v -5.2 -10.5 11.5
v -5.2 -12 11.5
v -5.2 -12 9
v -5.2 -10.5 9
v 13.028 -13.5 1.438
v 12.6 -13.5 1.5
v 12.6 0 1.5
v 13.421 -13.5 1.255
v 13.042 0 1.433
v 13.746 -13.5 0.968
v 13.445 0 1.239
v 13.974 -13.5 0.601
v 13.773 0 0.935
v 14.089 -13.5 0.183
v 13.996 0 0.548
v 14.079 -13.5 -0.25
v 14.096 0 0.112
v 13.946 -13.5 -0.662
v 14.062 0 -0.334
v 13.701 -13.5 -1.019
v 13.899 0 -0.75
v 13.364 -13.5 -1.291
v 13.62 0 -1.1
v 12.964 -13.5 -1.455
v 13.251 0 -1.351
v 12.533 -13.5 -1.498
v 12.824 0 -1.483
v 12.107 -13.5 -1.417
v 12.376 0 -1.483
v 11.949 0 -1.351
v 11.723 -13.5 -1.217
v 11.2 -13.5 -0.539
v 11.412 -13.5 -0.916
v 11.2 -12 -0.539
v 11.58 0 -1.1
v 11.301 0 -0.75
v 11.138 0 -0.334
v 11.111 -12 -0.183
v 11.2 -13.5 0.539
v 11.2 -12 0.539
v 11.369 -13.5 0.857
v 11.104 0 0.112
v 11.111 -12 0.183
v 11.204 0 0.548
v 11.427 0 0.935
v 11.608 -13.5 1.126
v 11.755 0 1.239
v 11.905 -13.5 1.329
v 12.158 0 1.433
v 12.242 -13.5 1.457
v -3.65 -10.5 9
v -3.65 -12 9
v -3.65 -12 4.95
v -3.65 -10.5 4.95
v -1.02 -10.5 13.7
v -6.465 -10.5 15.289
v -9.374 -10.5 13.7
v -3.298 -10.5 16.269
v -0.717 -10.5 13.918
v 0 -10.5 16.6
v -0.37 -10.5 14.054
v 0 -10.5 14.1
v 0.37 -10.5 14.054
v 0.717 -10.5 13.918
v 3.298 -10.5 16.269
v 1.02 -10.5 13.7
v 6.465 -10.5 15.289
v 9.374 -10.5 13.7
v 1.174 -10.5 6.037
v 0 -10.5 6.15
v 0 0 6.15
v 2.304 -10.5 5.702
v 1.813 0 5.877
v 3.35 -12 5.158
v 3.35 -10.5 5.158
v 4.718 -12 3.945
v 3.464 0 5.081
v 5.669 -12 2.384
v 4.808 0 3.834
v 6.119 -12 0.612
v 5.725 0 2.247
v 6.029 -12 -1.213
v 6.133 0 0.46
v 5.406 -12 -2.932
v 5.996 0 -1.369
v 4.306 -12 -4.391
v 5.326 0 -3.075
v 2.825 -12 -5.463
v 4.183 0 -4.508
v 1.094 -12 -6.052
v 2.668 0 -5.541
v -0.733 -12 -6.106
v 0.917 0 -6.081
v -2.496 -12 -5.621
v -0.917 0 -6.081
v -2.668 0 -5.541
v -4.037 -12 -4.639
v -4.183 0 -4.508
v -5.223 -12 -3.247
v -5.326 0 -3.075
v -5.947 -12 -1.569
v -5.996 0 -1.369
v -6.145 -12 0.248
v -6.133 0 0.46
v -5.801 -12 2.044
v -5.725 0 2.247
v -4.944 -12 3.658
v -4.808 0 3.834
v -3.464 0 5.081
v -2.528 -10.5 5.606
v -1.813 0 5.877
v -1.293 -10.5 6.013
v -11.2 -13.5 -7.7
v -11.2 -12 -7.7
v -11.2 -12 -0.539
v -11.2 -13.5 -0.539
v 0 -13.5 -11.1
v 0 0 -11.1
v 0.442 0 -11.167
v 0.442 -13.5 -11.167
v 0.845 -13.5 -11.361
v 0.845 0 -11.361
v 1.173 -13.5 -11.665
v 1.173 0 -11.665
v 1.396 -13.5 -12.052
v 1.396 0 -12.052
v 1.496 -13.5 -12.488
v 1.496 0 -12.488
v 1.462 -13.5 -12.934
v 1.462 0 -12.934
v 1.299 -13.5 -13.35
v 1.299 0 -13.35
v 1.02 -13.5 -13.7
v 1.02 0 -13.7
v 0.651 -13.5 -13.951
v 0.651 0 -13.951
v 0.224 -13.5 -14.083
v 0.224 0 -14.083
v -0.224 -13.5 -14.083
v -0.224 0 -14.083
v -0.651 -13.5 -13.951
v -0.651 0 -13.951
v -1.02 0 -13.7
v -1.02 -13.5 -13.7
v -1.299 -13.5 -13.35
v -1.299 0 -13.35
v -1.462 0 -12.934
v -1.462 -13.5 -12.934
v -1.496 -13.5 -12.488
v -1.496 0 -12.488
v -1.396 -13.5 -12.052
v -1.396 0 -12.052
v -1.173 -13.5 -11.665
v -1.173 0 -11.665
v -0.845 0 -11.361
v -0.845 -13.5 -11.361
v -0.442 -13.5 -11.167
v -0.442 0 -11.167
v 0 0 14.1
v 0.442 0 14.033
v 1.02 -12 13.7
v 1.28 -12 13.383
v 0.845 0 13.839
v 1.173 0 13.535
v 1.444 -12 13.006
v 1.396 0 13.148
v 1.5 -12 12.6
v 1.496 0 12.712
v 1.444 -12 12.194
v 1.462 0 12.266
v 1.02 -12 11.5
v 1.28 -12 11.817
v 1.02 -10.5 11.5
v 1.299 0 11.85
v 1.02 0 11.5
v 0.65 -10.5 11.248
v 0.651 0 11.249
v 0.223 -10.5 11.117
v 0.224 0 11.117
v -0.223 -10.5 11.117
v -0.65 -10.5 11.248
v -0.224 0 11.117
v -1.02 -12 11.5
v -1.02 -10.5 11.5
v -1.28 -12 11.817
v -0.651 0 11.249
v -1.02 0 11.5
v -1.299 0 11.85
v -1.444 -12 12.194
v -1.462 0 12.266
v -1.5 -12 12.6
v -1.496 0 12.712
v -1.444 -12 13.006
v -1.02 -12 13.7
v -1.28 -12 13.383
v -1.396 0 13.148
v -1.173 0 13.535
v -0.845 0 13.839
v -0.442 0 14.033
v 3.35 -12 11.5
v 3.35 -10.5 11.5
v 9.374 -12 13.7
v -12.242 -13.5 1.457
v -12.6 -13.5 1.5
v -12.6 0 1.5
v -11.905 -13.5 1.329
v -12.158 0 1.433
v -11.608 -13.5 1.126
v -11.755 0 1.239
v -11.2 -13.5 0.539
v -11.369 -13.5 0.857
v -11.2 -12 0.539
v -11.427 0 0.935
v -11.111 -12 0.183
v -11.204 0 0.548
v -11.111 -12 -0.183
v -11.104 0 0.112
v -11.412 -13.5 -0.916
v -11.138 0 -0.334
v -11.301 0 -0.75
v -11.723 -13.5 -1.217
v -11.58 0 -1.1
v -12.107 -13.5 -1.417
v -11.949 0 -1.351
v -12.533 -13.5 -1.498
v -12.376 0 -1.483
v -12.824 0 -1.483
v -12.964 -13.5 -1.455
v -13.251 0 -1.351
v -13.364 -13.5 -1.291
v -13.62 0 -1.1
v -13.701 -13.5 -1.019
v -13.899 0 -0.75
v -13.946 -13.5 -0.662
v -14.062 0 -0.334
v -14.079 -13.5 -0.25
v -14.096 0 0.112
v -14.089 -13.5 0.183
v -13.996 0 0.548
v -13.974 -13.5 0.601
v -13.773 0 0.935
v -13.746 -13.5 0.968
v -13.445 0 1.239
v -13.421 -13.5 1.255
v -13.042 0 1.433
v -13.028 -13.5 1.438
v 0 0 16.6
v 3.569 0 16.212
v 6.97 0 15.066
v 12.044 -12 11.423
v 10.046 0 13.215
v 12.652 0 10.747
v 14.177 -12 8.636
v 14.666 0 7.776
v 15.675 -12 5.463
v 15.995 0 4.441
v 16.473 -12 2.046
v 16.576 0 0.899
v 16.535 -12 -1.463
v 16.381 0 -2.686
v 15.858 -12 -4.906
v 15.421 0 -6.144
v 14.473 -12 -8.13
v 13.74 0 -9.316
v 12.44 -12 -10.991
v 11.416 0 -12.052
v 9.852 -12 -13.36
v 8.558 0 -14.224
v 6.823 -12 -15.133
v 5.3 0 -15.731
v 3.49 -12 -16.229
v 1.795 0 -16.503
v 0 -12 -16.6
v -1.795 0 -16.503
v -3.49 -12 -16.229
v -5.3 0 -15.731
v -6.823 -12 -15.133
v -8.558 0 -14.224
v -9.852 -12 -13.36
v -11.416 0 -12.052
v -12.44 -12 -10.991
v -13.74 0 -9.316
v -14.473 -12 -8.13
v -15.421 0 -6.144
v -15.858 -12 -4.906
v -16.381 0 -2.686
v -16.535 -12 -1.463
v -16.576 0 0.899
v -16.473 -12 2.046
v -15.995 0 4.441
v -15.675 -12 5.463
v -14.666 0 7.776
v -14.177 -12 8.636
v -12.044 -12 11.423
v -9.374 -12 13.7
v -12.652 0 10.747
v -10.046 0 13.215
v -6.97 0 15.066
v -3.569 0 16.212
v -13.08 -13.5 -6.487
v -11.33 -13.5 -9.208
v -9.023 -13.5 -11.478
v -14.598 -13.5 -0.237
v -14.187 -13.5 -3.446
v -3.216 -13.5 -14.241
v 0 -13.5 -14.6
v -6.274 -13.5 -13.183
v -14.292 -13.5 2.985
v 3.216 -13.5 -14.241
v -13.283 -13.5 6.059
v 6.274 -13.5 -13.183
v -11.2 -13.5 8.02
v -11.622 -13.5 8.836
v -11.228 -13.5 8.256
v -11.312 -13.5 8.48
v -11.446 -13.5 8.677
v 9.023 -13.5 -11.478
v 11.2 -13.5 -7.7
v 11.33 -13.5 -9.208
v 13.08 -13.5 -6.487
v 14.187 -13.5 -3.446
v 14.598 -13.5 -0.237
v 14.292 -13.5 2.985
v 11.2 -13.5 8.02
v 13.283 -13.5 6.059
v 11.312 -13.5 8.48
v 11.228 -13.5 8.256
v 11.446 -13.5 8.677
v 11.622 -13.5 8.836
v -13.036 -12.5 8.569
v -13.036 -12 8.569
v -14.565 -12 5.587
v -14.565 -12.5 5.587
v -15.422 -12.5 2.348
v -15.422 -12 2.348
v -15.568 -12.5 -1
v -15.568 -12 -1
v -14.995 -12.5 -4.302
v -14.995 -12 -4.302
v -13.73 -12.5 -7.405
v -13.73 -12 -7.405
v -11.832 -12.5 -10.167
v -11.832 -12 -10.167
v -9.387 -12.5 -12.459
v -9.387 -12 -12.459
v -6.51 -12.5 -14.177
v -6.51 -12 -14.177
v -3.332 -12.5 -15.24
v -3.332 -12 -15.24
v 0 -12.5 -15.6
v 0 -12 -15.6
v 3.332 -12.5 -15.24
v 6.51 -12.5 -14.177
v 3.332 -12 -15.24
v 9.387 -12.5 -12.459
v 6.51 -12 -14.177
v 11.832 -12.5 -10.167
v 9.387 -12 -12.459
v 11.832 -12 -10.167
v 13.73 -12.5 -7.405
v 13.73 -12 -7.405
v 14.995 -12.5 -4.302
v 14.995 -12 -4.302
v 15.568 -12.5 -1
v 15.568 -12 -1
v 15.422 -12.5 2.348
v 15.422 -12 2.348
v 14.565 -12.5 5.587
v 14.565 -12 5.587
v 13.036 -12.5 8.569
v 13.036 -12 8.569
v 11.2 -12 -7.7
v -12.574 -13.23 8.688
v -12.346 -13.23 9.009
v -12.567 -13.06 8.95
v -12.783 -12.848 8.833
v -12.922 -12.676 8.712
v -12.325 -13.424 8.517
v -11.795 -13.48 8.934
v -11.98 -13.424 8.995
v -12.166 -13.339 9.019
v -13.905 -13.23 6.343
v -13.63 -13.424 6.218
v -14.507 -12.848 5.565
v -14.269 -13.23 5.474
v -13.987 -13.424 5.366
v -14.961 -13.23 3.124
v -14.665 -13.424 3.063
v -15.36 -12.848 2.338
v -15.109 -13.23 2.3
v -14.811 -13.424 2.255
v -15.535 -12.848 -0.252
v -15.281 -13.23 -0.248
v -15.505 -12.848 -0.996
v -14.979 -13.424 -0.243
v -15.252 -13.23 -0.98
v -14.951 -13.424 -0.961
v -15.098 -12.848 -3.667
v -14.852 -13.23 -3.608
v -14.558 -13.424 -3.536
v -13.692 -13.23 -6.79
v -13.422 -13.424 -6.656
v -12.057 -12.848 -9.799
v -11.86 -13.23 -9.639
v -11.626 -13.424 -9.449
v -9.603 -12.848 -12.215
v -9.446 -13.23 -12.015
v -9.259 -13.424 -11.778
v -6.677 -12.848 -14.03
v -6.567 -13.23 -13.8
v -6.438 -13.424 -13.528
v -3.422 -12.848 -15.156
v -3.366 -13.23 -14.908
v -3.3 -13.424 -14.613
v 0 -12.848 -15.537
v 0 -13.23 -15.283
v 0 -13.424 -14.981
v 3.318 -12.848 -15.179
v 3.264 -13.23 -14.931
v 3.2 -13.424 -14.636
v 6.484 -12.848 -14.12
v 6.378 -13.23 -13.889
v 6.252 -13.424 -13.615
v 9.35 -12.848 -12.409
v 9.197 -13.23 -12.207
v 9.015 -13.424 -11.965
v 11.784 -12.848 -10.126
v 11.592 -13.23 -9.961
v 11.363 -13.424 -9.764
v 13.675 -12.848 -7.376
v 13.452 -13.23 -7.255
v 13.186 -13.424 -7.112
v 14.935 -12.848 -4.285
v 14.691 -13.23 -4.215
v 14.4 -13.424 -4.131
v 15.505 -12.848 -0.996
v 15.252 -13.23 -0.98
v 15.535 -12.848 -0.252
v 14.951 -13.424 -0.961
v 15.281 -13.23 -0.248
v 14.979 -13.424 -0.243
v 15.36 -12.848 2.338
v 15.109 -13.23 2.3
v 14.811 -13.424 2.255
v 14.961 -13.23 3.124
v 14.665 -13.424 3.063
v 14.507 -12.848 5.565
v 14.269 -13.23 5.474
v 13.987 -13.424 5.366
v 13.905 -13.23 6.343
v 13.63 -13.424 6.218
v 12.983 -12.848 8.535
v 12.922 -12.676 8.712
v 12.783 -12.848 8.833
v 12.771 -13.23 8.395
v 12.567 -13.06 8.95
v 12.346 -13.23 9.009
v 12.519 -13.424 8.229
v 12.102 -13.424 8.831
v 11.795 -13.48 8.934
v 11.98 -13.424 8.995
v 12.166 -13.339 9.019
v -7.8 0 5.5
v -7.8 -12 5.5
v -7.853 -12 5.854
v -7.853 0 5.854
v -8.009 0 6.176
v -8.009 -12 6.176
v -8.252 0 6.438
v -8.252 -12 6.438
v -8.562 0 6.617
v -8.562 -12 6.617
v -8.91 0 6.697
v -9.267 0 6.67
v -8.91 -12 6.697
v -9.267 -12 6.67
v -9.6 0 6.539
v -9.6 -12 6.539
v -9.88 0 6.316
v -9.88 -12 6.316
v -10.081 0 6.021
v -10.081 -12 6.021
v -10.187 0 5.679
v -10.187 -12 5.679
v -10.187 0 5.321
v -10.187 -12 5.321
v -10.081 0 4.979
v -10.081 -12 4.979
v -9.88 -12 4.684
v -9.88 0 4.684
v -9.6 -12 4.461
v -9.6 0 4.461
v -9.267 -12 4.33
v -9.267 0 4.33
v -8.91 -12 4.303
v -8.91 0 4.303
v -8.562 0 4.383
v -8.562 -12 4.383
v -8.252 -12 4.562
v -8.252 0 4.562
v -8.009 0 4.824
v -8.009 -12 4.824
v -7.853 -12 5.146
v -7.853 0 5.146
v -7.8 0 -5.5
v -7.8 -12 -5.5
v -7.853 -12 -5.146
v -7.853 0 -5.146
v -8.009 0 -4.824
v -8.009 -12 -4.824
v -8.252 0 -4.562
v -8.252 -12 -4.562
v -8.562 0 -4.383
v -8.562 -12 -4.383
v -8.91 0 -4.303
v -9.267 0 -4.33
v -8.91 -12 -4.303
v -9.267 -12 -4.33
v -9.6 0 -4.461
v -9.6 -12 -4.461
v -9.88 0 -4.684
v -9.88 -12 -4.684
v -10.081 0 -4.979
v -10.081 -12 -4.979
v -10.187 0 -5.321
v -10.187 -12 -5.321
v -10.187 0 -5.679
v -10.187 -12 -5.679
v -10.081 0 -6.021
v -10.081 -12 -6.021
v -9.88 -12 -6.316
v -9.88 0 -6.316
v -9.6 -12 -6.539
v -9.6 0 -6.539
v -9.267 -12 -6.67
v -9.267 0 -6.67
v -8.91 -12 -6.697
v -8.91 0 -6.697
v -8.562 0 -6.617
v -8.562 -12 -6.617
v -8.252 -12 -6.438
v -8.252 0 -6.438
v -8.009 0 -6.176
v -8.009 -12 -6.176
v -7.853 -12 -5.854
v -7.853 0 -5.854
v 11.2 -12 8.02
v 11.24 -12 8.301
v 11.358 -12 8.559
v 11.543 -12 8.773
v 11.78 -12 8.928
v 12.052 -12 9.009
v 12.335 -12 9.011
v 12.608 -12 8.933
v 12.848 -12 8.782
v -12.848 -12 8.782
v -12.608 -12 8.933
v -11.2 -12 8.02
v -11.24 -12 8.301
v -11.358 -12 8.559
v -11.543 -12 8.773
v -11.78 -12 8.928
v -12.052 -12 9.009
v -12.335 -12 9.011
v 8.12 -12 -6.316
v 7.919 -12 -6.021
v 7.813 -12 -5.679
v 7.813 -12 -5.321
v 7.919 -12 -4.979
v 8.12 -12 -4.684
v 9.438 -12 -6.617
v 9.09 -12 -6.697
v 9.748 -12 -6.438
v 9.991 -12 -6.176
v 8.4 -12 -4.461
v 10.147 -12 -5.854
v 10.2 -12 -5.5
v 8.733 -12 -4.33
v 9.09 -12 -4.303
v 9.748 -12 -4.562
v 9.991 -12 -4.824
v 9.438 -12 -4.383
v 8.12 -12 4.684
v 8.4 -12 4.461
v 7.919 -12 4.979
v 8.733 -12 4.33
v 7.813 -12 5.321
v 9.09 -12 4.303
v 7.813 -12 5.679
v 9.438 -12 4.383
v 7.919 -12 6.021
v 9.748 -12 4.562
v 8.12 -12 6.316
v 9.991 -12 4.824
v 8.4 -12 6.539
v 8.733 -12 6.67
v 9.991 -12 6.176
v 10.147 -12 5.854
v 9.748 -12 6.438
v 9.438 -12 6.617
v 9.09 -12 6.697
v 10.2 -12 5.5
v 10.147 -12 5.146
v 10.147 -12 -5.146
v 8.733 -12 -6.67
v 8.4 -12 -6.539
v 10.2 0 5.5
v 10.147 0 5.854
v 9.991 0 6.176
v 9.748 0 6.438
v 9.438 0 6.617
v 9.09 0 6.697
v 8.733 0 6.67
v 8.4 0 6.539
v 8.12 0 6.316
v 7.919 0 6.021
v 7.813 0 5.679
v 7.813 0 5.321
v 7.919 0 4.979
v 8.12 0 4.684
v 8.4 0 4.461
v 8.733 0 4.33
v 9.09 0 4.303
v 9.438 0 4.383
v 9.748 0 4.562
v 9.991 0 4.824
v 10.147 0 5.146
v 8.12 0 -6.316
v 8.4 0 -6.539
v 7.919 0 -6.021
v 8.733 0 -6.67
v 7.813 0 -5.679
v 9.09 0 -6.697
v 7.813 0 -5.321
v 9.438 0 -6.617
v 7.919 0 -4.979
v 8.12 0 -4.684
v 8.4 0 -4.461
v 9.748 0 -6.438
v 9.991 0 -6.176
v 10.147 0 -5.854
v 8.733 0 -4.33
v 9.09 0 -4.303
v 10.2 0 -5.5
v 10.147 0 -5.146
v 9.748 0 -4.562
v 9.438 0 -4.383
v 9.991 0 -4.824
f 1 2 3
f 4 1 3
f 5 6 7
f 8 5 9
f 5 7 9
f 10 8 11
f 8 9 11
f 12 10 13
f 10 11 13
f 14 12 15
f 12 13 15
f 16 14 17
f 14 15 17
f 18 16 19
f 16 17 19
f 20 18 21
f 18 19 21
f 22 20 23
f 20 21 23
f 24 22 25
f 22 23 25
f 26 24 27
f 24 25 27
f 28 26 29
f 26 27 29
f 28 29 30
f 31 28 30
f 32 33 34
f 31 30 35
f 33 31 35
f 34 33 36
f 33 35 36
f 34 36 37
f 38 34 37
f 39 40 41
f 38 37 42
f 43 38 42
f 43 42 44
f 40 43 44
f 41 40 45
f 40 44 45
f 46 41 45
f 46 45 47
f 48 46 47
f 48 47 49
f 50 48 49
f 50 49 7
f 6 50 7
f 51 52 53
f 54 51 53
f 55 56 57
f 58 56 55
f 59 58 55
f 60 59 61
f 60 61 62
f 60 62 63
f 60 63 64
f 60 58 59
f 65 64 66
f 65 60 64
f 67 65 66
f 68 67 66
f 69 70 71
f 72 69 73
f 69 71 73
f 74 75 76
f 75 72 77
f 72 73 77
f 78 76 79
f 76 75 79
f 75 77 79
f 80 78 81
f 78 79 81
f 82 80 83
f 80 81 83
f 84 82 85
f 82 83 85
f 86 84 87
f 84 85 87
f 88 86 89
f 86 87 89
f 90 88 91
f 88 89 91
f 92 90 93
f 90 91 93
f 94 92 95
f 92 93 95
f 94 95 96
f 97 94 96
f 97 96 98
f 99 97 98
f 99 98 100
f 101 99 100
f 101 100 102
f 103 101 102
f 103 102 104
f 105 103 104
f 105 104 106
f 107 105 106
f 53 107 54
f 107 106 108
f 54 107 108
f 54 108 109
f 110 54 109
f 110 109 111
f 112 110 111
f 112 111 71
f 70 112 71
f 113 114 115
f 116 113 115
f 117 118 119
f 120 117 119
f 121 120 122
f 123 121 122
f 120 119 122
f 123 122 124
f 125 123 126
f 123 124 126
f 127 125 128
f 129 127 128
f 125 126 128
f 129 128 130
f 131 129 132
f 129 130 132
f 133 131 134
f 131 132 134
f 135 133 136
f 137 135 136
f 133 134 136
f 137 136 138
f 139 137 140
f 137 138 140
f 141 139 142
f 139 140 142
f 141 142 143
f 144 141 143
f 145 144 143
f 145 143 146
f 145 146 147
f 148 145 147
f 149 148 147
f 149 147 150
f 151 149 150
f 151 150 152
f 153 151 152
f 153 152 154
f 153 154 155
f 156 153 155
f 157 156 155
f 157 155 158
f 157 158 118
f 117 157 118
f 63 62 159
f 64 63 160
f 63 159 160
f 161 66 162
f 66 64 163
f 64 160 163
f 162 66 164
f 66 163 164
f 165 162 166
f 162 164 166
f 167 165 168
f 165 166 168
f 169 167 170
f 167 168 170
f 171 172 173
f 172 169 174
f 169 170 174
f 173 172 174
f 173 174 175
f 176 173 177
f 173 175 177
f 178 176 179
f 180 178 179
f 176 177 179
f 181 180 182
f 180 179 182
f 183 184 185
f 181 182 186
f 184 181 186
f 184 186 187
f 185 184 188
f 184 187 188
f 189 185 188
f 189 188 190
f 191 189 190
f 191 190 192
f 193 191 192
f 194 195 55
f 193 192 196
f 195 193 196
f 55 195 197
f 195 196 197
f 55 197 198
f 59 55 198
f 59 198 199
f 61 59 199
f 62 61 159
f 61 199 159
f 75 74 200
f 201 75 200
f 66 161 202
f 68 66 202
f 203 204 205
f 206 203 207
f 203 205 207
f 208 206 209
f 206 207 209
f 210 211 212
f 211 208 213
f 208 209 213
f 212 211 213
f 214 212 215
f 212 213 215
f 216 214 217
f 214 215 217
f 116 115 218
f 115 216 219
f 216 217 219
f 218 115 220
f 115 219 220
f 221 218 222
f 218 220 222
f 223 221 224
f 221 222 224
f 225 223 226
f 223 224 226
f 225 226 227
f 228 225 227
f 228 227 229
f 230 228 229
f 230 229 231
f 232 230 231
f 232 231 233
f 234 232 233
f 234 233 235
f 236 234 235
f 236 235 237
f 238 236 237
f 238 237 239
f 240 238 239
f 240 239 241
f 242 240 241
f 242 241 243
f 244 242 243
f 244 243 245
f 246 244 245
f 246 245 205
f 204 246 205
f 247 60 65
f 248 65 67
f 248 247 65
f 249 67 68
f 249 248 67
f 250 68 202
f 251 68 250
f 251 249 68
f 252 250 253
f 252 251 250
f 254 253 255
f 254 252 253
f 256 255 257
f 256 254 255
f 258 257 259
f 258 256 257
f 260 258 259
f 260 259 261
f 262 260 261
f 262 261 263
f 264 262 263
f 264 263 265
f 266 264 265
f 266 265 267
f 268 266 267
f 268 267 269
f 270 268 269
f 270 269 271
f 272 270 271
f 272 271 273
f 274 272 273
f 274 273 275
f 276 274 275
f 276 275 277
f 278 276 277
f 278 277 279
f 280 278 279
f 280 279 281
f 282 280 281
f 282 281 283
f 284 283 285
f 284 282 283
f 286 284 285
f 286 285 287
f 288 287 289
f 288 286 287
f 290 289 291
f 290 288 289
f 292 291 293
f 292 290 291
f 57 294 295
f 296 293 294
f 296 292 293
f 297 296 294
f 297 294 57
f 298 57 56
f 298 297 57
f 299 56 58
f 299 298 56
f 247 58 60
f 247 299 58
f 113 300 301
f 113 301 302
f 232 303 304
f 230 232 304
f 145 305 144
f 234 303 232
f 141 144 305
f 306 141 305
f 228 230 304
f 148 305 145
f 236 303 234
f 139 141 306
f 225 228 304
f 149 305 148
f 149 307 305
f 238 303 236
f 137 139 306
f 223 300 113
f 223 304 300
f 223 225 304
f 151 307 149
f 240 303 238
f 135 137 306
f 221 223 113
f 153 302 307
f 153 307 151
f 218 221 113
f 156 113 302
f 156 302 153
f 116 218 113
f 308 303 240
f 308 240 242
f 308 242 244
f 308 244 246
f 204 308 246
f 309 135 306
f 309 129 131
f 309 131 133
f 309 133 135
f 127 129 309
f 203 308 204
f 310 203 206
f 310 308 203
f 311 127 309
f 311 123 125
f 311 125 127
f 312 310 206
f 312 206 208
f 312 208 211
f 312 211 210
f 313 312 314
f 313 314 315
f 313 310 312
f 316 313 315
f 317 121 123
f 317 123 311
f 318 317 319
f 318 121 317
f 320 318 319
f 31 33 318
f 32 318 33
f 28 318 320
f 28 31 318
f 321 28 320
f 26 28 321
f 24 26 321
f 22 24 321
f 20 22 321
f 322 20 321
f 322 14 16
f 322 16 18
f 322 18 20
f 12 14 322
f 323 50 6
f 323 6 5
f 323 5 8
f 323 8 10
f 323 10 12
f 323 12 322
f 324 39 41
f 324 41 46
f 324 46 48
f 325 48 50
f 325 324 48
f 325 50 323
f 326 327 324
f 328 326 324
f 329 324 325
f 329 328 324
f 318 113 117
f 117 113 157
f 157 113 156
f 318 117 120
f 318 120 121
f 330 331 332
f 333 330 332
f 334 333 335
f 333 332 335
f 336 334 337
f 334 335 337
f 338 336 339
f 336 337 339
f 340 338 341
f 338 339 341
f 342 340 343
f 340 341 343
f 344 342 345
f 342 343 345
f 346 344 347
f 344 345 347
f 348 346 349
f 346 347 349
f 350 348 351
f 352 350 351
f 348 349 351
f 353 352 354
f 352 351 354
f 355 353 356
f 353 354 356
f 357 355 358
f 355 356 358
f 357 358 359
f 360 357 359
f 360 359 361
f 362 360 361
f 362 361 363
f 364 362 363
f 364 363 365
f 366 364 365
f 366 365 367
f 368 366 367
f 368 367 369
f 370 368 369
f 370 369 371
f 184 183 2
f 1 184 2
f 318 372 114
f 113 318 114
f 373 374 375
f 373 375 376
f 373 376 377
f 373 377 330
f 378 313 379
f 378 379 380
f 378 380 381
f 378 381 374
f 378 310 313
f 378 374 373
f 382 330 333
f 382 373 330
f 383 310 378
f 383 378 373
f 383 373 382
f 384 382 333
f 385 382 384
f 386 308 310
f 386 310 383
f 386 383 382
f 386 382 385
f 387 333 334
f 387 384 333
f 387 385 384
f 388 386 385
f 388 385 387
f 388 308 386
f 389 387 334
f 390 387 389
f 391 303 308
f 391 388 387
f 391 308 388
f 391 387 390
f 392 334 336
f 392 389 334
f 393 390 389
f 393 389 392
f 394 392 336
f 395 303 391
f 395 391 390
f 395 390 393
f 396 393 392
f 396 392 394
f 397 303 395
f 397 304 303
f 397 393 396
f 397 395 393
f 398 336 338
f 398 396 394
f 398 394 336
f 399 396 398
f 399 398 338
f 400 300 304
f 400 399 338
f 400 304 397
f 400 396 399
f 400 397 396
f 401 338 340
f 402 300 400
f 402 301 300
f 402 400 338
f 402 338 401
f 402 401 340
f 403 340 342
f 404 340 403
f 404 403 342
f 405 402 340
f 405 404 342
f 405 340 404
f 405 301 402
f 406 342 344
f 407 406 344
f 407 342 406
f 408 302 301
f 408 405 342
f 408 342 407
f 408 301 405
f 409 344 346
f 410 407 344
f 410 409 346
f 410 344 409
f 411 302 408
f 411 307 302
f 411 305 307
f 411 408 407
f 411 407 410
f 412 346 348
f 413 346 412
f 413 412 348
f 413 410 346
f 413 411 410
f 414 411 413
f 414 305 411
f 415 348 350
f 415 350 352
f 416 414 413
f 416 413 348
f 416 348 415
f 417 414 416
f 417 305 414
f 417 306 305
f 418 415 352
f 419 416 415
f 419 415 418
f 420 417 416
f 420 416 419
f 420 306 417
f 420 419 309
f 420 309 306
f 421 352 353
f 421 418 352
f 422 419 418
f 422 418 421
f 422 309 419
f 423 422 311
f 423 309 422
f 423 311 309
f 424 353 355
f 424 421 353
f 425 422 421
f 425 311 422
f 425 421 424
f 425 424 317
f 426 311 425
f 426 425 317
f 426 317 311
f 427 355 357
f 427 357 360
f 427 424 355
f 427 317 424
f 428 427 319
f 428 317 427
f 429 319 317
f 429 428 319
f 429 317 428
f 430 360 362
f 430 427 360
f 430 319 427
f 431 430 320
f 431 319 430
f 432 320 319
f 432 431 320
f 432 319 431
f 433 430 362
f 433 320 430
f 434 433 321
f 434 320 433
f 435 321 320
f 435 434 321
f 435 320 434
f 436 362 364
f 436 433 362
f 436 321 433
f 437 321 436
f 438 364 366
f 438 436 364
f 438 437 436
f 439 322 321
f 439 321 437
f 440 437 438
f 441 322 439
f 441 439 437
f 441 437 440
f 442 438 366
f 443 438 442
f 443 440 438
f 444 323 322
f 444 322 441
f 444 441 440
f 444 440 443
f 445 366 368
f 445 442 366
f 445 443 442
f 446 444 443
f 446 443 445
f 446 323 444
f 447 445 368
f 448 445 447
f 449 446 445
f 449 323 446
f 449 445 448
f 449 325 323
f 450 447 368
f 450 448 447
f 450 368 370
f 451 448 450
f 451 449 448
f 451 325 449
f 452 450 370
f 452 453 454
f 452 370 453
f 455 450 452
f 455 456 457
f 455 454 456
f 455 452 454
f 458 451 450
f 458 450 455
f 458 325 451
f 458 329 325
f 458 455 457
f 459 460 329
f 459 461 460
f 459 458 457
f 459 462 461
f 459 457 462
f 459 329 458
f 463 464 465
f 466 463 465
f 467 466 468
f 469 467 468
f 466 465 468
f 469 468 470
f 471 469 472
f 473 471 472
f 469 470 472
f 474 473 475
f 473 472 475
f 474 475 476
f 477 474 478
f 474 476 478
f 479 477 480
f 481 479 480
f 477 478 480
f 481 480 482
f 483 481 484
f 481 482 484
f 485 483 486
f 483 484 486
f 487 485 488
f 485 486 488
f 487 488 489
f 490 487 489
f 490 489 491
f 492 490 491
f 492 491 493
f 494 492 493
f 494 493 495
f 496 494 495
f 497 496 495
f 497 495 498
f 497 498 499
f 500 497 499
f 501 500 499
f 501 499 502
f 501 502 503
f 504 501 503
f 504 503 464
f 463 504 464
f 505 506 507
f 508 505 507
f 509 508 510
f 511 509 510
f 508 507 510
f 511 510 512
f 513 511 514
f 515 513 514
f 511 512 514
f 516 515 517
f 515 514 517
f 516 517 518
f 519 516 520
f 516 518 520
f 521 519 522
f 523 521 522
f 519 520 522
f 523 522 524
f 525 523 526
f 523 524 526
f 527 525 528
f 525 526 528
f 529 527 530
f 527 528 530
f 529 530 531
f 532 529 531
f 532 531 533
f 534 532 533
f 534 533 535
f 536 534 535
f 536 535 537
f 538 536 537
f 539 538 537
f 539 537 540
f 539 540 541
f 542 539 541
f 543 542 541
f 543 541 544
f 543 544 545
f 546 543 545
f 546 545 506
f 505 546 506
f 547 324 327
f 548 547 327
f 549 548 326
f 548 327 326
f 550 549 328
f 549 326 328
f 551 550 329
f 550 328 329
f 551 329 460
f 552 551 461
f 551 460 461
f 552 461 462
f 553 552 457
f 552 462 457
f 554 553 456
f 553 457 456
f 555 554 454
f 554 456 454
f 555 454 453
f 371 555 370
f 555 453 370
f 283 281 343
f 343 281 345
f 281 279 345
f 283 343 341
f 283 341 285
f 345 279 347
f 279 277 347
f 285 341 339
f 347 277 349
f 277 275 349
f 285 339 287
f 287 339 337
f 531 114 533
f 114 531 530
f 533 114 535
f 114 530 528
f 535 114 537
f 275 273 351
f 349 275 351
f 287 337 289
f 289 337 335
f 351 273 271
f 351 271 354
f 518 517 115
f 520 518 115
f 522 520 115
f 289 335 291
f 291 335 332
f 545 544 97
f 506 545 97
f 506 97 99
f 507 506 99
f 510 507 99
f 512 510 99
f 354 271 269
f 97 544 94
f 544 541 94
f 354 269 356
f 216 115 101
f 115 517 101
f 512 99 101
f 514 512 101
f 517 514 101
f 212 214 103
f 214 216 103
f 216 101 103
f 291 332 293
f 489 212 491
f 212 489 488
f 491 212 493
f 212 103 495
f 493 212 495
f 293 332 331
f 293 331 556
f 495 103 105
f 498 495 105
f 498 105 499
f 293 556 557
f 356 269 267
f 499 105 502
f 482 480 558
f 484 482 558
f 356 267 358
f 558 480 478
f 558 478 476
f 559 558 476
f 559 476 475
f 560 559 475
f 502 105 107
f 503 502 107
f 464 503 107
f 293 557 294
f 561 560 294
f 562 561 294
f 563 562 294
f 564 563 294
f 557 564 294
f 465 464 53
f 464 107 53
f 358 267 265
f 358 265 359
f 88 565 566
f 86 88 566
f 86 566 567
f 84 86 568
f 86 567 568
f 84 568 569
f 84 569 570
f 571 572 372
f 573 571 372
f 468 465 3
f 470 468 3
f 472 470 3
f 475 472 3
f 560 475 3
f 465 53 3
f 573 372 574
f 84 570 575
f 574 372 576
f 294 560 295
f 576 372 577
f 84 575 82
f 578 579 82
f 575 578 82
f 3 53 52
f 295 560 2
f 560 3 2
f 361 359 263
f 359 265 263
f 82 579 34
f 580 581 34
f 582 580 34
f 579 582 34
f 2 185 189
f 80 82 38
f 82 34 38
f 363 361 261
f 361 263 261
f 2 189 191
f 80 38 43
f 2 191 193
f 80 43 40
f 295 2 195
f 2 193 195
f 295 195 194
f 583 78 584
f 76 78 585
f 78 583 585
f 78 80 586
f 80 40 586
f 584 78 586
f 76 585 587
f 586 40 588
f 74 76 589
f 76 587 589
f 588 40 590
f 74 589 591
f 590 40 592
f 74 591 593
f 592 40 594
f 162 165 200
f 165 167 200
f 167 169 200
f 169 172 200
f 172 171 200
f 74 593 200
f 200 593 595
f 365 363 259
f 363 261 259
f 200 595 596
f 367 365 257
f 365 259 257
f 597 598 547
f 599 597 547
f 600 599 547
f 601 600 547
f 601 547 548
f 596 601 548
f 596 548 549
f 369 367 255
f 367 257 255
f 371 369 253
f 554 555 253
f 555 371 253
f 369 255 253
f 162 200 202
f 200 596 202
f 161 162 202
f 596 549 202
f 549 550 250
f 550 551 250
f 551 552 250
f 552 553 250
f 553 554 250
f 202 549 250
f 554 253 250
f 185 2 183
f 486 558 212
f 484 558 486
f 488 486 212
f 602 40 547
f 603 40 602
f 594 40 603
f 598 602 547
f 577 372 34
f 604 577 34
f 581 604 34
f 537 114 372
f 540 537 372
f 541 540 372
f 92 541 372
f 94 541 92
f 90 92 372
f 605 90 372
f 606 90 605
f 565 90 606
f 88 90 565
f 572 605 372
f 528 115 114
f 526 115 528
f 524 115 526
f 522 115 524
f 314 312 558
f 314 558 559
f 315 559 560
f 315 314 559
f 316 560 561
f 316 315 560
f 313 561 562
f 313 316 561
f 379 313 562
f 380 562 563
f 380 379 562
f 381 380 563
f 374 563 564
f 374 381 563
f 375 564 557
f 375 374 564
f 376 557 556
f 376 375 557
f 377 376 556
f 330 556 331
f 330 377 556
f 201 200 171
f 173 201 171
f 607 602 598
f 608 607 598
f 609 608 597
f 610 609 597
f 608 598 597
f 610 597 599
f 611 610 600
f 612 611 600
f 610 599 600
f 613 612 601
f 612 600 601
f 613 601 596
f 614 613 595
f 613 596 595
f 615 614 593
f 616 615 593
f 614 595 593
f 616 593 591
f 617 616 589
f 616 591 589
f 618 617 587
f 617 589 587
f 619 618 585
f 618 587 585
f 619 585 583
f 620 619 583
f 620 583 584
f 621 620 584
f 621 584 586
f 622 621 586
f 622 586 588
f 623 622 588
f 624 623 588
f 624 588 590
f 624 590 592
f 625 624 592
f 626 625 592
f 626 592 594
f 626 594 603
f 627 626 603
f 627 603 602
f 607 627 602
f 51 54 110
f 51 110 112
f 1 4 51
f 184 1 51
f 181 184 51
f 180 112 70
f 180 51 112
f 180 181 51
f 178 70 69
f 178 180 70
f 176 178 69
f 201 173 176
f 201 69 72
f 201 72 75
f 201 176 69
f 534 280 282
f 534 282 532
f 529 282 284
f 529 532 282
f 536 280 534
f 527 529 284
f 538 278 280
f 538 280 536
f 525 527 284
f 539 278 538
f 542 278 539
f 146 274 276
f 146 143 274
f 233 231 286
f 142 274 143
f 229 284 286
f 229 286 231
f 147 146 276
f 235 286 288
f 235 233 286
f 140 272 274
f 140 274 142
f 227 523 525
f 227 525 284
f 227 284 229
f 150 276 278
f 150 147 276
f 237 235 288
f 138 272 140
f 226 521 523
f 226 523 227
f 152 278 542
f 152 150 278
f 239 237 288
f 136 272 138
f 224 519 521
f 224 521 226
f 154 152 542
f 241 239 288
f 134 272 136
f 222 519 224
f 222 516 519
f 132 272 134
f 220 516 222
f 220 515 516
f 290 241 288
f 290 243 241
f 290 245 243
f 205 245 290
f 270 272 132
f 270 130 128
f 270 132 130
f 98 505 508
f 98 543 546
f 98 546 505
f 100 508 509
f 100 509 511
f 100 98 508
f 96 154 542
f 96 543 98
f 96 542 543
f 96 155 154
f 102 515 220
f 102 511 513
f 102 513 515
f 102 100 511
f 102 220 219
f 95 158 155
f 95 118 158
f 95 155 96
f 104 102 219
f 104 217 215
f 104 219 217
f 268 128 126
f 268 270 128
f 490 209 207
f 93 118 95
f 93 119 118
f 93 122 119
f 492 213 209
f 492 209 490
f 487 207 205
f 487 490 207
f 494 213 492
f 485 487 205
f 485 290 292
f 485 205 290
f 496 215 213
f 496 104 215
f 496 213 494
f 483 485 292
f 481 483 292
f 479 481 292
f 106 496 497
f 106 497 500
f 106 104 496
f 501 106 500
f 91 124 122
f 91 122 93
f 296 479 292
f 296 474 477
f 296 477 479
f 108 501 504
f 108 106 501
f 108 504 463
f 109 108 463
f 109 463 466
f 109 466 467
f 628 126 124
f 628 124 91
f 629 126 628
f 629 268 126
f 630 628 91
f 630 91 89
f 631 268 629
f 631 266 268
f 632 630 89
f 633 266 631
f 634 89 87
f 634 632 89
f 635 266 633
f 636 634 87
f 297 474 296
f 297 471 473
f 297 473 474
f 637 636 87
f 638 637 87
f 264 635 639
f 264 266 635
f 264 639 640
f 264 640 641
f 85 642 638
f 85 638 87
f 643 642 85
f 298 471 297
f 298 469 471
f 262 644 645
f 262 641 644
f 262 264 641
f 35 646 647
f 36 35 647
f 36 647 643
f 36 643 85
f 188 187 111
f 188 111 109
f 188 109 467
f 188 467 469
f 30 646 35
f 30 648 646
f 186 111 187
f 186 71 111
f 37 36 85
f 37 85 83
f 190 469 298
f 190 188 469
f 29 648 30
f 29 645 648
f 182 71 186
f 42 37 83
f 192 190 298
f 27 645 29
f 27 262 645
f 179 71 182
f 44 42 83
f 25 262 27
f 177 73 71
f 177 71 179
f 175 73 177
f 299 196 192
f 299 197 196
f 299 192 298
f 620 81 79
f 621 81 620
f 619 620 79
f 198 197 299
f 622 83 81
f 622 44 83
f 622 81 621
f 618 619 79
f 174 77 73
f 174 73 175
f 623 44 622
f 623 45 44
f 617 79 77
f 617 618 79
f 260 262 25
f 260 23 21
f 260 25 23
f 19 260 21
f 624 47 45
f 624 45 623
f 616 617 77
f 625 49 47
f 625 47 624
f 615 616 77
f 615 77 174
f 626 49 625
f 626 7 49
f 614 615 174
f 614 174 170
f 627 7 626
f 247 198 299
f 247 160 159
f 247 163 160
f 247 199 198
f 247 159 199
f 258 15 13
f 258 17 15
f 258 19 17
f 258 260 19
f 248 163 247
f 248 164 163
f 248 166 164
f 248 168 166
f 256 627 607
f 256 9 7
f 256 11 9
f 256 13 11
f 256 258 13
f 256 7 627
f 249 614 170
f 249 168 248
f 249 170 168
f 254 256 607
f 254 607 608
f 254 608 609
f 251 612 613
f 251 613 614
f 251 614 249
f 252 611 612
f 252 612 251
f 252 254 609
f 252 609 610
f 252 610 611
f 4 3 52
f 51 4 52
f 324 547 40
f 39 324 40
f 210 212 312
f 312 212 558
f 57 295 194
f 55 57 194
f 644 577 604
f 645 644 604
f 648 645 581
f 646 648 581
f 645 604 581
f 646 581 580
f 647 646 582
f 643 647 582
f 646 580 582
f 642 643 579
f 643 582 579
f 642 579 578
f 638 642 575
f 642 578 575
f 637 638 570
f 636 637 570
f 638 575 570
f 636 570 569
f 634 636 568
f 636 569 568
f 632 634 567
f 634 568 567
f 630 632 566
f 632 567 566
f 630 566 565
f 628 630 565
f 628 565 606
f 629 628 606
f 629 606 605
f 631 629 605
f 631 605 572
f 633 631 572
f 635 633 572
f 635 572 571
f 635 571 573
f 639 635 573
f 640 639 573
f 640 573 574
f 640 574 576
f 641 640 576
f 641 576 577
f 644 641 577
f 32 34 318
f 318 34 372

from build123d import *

# Parameters (mm, degrees)
SKETCH4_R           = 16.6
SKETCH4_R_2         = 6.15
BOSS_EXTRUDE1_DEPTH = 12
BOSS_EXTRUDE2_DEPTH = 1.5
SKETCH6_R           = 1.2
CUT_EXTRUDE1_DEPTH  = 27.365128484
SKETCH7_R           = 1.5
CUT_EXTRUDE2_DEPTH  = 28.08080501
FILLET1_R           = 1
FILLET2_R           = 1
SKETCH8_W           = 20
SKETCH8_H           = 5
CUT_EXTRUDE3_DEPTH  = 1.5


with BuildPart() as part:
    # Sketch4 → Boss-Extrude1 (new body)
    with BuildSketch(Plane(origin=(0, 0, 0), x_dir=(1, 0, 0), z_dir=(0, 1, 0))):
        with Locations(Location((0, 0, 0), (0, 0, 270))):
            Circle(SKETCH4_R)
        with Locations(Location((0, 0, 0), (0, 0, 270))):
            Circle(SKETCH4_R_2, mode=Mode.SUBTRACT)
    extrude(amount=-BOSS_EXTRUDE1_DEPTH)

    # Sketch5 → Boss-Extrude2 (add)
    with BuildSketch(Plane.XZ.offset(12)):
        with BuildLine():
            Line((11.2, 10.859097568), (11.2, -7.7))
            Line((11.2, -7.7), (-11.2, -7.7))
            Line((-11.2, -7.7), (-11.2, 10.859097568))
            ThreePointArc((-11.2, 10.859097568), (0, -15.6), (11.2, 10.859097568))
        make_face()
    extrude(amount=BOSS_EXTRUDE2_DEPTH)

    # Sketch6 → Cut-Extrude1 (cut, through all)
    with BuildSketch(Plane.XZ.offset(12)):
        with Locations((9, -5.5)):
            Circle(SKETCH6_R)
        with Locations((9, 5.5)):
            Circle(SKETCH6_R)
        with Locations((-9, 5.5)):
            Circle(SKETCH6_R)
        with Locations((-9, -5.5)):
            Circle(SKETCH6_R)
    extrude(amount=-CUT_EXTRUDE1_DEPTH, mode=Mode.SUBTRACT)

    # Sketch7 → Cut-Extrude2 (cut, through all)
    with BuildSketch(Plane(origin=(0, 0, 0), x_dir=(1, 0, 0), z_dir=(0, 1, 0))):
        with Locations(Location((0, 12.6, 0), (0, 0, 270))):
            Circle(SKETCH7_R)
        with Locations(Location((12.6, 0, 0), (0, 0, 270))):
            Circle(SKETCH7_R)
        with Locations(Location((-12.6, 0, 0), (0, 0, 270))):
            Circle(SKETCH7_R)
        with Locations(Location((0, -12.6, 0), (0, 0, 270))):
            Circle(SKETCH7_R)
    extrude(amount=-CUT_EXTRUDE2_DEPTH, mode=Mode.SUBTRACT)

    # Fillet1
    fillet1_edges = [part.edges().sort_by_distance(p)[0] for p in [
        (-11.2, -12.75, 10.859097568),
        (11.2, -12.75, 10.859097568),
    ]]
    fillet(fillet1_edges, radius=FILLET1_R)

    # Fillet2
    # the kernel refuses this fillet: 1 mm, written as the material it takes off along each edge
    with BuildSketch(Plane(origin=(0, -13.5, 0), x_dir=(-0.7369271930502395, 0, 0.675972123791429), z_dir=(0.675972123791429, 0, 0.7369271930502395))) as fillet2_piece_1:
        with BuildLine():
            CenterArc((15.6 - FILLET2_R, -FILLET2_R), FILLET2_R, 0, 90)
            Line((15.6 - FILLET2_R, 0), (15.6, 0))
            Line((15.6, 0), (15.6, -FILLET2_R))
        make_face()
    revolve(axis=Axis((0, -13.5, 0), (0, -1, 0)), revolution_arc=265.059373538, mode=Mode.SUBTRACT)

    # Sketch8 → Cut-Extrude3 (cut)
    with BuildSketch(Plane.XZ.offset(12)):
        with Locations((0, 16.2)):
            Rectangle(SKETCH8_W, SKETCH8_H)
        Polygon((3.35, 11.5), (-5.2, 11.5), (-5.2, 9), (-3.65, 9), (-3.65, 4.5), (3.35, 4.5), align=None)
    extrude(amount=-CUT_EXTRUDE3_DEPTH, mode=Mode.SUBTRACT)


solid = part.part
